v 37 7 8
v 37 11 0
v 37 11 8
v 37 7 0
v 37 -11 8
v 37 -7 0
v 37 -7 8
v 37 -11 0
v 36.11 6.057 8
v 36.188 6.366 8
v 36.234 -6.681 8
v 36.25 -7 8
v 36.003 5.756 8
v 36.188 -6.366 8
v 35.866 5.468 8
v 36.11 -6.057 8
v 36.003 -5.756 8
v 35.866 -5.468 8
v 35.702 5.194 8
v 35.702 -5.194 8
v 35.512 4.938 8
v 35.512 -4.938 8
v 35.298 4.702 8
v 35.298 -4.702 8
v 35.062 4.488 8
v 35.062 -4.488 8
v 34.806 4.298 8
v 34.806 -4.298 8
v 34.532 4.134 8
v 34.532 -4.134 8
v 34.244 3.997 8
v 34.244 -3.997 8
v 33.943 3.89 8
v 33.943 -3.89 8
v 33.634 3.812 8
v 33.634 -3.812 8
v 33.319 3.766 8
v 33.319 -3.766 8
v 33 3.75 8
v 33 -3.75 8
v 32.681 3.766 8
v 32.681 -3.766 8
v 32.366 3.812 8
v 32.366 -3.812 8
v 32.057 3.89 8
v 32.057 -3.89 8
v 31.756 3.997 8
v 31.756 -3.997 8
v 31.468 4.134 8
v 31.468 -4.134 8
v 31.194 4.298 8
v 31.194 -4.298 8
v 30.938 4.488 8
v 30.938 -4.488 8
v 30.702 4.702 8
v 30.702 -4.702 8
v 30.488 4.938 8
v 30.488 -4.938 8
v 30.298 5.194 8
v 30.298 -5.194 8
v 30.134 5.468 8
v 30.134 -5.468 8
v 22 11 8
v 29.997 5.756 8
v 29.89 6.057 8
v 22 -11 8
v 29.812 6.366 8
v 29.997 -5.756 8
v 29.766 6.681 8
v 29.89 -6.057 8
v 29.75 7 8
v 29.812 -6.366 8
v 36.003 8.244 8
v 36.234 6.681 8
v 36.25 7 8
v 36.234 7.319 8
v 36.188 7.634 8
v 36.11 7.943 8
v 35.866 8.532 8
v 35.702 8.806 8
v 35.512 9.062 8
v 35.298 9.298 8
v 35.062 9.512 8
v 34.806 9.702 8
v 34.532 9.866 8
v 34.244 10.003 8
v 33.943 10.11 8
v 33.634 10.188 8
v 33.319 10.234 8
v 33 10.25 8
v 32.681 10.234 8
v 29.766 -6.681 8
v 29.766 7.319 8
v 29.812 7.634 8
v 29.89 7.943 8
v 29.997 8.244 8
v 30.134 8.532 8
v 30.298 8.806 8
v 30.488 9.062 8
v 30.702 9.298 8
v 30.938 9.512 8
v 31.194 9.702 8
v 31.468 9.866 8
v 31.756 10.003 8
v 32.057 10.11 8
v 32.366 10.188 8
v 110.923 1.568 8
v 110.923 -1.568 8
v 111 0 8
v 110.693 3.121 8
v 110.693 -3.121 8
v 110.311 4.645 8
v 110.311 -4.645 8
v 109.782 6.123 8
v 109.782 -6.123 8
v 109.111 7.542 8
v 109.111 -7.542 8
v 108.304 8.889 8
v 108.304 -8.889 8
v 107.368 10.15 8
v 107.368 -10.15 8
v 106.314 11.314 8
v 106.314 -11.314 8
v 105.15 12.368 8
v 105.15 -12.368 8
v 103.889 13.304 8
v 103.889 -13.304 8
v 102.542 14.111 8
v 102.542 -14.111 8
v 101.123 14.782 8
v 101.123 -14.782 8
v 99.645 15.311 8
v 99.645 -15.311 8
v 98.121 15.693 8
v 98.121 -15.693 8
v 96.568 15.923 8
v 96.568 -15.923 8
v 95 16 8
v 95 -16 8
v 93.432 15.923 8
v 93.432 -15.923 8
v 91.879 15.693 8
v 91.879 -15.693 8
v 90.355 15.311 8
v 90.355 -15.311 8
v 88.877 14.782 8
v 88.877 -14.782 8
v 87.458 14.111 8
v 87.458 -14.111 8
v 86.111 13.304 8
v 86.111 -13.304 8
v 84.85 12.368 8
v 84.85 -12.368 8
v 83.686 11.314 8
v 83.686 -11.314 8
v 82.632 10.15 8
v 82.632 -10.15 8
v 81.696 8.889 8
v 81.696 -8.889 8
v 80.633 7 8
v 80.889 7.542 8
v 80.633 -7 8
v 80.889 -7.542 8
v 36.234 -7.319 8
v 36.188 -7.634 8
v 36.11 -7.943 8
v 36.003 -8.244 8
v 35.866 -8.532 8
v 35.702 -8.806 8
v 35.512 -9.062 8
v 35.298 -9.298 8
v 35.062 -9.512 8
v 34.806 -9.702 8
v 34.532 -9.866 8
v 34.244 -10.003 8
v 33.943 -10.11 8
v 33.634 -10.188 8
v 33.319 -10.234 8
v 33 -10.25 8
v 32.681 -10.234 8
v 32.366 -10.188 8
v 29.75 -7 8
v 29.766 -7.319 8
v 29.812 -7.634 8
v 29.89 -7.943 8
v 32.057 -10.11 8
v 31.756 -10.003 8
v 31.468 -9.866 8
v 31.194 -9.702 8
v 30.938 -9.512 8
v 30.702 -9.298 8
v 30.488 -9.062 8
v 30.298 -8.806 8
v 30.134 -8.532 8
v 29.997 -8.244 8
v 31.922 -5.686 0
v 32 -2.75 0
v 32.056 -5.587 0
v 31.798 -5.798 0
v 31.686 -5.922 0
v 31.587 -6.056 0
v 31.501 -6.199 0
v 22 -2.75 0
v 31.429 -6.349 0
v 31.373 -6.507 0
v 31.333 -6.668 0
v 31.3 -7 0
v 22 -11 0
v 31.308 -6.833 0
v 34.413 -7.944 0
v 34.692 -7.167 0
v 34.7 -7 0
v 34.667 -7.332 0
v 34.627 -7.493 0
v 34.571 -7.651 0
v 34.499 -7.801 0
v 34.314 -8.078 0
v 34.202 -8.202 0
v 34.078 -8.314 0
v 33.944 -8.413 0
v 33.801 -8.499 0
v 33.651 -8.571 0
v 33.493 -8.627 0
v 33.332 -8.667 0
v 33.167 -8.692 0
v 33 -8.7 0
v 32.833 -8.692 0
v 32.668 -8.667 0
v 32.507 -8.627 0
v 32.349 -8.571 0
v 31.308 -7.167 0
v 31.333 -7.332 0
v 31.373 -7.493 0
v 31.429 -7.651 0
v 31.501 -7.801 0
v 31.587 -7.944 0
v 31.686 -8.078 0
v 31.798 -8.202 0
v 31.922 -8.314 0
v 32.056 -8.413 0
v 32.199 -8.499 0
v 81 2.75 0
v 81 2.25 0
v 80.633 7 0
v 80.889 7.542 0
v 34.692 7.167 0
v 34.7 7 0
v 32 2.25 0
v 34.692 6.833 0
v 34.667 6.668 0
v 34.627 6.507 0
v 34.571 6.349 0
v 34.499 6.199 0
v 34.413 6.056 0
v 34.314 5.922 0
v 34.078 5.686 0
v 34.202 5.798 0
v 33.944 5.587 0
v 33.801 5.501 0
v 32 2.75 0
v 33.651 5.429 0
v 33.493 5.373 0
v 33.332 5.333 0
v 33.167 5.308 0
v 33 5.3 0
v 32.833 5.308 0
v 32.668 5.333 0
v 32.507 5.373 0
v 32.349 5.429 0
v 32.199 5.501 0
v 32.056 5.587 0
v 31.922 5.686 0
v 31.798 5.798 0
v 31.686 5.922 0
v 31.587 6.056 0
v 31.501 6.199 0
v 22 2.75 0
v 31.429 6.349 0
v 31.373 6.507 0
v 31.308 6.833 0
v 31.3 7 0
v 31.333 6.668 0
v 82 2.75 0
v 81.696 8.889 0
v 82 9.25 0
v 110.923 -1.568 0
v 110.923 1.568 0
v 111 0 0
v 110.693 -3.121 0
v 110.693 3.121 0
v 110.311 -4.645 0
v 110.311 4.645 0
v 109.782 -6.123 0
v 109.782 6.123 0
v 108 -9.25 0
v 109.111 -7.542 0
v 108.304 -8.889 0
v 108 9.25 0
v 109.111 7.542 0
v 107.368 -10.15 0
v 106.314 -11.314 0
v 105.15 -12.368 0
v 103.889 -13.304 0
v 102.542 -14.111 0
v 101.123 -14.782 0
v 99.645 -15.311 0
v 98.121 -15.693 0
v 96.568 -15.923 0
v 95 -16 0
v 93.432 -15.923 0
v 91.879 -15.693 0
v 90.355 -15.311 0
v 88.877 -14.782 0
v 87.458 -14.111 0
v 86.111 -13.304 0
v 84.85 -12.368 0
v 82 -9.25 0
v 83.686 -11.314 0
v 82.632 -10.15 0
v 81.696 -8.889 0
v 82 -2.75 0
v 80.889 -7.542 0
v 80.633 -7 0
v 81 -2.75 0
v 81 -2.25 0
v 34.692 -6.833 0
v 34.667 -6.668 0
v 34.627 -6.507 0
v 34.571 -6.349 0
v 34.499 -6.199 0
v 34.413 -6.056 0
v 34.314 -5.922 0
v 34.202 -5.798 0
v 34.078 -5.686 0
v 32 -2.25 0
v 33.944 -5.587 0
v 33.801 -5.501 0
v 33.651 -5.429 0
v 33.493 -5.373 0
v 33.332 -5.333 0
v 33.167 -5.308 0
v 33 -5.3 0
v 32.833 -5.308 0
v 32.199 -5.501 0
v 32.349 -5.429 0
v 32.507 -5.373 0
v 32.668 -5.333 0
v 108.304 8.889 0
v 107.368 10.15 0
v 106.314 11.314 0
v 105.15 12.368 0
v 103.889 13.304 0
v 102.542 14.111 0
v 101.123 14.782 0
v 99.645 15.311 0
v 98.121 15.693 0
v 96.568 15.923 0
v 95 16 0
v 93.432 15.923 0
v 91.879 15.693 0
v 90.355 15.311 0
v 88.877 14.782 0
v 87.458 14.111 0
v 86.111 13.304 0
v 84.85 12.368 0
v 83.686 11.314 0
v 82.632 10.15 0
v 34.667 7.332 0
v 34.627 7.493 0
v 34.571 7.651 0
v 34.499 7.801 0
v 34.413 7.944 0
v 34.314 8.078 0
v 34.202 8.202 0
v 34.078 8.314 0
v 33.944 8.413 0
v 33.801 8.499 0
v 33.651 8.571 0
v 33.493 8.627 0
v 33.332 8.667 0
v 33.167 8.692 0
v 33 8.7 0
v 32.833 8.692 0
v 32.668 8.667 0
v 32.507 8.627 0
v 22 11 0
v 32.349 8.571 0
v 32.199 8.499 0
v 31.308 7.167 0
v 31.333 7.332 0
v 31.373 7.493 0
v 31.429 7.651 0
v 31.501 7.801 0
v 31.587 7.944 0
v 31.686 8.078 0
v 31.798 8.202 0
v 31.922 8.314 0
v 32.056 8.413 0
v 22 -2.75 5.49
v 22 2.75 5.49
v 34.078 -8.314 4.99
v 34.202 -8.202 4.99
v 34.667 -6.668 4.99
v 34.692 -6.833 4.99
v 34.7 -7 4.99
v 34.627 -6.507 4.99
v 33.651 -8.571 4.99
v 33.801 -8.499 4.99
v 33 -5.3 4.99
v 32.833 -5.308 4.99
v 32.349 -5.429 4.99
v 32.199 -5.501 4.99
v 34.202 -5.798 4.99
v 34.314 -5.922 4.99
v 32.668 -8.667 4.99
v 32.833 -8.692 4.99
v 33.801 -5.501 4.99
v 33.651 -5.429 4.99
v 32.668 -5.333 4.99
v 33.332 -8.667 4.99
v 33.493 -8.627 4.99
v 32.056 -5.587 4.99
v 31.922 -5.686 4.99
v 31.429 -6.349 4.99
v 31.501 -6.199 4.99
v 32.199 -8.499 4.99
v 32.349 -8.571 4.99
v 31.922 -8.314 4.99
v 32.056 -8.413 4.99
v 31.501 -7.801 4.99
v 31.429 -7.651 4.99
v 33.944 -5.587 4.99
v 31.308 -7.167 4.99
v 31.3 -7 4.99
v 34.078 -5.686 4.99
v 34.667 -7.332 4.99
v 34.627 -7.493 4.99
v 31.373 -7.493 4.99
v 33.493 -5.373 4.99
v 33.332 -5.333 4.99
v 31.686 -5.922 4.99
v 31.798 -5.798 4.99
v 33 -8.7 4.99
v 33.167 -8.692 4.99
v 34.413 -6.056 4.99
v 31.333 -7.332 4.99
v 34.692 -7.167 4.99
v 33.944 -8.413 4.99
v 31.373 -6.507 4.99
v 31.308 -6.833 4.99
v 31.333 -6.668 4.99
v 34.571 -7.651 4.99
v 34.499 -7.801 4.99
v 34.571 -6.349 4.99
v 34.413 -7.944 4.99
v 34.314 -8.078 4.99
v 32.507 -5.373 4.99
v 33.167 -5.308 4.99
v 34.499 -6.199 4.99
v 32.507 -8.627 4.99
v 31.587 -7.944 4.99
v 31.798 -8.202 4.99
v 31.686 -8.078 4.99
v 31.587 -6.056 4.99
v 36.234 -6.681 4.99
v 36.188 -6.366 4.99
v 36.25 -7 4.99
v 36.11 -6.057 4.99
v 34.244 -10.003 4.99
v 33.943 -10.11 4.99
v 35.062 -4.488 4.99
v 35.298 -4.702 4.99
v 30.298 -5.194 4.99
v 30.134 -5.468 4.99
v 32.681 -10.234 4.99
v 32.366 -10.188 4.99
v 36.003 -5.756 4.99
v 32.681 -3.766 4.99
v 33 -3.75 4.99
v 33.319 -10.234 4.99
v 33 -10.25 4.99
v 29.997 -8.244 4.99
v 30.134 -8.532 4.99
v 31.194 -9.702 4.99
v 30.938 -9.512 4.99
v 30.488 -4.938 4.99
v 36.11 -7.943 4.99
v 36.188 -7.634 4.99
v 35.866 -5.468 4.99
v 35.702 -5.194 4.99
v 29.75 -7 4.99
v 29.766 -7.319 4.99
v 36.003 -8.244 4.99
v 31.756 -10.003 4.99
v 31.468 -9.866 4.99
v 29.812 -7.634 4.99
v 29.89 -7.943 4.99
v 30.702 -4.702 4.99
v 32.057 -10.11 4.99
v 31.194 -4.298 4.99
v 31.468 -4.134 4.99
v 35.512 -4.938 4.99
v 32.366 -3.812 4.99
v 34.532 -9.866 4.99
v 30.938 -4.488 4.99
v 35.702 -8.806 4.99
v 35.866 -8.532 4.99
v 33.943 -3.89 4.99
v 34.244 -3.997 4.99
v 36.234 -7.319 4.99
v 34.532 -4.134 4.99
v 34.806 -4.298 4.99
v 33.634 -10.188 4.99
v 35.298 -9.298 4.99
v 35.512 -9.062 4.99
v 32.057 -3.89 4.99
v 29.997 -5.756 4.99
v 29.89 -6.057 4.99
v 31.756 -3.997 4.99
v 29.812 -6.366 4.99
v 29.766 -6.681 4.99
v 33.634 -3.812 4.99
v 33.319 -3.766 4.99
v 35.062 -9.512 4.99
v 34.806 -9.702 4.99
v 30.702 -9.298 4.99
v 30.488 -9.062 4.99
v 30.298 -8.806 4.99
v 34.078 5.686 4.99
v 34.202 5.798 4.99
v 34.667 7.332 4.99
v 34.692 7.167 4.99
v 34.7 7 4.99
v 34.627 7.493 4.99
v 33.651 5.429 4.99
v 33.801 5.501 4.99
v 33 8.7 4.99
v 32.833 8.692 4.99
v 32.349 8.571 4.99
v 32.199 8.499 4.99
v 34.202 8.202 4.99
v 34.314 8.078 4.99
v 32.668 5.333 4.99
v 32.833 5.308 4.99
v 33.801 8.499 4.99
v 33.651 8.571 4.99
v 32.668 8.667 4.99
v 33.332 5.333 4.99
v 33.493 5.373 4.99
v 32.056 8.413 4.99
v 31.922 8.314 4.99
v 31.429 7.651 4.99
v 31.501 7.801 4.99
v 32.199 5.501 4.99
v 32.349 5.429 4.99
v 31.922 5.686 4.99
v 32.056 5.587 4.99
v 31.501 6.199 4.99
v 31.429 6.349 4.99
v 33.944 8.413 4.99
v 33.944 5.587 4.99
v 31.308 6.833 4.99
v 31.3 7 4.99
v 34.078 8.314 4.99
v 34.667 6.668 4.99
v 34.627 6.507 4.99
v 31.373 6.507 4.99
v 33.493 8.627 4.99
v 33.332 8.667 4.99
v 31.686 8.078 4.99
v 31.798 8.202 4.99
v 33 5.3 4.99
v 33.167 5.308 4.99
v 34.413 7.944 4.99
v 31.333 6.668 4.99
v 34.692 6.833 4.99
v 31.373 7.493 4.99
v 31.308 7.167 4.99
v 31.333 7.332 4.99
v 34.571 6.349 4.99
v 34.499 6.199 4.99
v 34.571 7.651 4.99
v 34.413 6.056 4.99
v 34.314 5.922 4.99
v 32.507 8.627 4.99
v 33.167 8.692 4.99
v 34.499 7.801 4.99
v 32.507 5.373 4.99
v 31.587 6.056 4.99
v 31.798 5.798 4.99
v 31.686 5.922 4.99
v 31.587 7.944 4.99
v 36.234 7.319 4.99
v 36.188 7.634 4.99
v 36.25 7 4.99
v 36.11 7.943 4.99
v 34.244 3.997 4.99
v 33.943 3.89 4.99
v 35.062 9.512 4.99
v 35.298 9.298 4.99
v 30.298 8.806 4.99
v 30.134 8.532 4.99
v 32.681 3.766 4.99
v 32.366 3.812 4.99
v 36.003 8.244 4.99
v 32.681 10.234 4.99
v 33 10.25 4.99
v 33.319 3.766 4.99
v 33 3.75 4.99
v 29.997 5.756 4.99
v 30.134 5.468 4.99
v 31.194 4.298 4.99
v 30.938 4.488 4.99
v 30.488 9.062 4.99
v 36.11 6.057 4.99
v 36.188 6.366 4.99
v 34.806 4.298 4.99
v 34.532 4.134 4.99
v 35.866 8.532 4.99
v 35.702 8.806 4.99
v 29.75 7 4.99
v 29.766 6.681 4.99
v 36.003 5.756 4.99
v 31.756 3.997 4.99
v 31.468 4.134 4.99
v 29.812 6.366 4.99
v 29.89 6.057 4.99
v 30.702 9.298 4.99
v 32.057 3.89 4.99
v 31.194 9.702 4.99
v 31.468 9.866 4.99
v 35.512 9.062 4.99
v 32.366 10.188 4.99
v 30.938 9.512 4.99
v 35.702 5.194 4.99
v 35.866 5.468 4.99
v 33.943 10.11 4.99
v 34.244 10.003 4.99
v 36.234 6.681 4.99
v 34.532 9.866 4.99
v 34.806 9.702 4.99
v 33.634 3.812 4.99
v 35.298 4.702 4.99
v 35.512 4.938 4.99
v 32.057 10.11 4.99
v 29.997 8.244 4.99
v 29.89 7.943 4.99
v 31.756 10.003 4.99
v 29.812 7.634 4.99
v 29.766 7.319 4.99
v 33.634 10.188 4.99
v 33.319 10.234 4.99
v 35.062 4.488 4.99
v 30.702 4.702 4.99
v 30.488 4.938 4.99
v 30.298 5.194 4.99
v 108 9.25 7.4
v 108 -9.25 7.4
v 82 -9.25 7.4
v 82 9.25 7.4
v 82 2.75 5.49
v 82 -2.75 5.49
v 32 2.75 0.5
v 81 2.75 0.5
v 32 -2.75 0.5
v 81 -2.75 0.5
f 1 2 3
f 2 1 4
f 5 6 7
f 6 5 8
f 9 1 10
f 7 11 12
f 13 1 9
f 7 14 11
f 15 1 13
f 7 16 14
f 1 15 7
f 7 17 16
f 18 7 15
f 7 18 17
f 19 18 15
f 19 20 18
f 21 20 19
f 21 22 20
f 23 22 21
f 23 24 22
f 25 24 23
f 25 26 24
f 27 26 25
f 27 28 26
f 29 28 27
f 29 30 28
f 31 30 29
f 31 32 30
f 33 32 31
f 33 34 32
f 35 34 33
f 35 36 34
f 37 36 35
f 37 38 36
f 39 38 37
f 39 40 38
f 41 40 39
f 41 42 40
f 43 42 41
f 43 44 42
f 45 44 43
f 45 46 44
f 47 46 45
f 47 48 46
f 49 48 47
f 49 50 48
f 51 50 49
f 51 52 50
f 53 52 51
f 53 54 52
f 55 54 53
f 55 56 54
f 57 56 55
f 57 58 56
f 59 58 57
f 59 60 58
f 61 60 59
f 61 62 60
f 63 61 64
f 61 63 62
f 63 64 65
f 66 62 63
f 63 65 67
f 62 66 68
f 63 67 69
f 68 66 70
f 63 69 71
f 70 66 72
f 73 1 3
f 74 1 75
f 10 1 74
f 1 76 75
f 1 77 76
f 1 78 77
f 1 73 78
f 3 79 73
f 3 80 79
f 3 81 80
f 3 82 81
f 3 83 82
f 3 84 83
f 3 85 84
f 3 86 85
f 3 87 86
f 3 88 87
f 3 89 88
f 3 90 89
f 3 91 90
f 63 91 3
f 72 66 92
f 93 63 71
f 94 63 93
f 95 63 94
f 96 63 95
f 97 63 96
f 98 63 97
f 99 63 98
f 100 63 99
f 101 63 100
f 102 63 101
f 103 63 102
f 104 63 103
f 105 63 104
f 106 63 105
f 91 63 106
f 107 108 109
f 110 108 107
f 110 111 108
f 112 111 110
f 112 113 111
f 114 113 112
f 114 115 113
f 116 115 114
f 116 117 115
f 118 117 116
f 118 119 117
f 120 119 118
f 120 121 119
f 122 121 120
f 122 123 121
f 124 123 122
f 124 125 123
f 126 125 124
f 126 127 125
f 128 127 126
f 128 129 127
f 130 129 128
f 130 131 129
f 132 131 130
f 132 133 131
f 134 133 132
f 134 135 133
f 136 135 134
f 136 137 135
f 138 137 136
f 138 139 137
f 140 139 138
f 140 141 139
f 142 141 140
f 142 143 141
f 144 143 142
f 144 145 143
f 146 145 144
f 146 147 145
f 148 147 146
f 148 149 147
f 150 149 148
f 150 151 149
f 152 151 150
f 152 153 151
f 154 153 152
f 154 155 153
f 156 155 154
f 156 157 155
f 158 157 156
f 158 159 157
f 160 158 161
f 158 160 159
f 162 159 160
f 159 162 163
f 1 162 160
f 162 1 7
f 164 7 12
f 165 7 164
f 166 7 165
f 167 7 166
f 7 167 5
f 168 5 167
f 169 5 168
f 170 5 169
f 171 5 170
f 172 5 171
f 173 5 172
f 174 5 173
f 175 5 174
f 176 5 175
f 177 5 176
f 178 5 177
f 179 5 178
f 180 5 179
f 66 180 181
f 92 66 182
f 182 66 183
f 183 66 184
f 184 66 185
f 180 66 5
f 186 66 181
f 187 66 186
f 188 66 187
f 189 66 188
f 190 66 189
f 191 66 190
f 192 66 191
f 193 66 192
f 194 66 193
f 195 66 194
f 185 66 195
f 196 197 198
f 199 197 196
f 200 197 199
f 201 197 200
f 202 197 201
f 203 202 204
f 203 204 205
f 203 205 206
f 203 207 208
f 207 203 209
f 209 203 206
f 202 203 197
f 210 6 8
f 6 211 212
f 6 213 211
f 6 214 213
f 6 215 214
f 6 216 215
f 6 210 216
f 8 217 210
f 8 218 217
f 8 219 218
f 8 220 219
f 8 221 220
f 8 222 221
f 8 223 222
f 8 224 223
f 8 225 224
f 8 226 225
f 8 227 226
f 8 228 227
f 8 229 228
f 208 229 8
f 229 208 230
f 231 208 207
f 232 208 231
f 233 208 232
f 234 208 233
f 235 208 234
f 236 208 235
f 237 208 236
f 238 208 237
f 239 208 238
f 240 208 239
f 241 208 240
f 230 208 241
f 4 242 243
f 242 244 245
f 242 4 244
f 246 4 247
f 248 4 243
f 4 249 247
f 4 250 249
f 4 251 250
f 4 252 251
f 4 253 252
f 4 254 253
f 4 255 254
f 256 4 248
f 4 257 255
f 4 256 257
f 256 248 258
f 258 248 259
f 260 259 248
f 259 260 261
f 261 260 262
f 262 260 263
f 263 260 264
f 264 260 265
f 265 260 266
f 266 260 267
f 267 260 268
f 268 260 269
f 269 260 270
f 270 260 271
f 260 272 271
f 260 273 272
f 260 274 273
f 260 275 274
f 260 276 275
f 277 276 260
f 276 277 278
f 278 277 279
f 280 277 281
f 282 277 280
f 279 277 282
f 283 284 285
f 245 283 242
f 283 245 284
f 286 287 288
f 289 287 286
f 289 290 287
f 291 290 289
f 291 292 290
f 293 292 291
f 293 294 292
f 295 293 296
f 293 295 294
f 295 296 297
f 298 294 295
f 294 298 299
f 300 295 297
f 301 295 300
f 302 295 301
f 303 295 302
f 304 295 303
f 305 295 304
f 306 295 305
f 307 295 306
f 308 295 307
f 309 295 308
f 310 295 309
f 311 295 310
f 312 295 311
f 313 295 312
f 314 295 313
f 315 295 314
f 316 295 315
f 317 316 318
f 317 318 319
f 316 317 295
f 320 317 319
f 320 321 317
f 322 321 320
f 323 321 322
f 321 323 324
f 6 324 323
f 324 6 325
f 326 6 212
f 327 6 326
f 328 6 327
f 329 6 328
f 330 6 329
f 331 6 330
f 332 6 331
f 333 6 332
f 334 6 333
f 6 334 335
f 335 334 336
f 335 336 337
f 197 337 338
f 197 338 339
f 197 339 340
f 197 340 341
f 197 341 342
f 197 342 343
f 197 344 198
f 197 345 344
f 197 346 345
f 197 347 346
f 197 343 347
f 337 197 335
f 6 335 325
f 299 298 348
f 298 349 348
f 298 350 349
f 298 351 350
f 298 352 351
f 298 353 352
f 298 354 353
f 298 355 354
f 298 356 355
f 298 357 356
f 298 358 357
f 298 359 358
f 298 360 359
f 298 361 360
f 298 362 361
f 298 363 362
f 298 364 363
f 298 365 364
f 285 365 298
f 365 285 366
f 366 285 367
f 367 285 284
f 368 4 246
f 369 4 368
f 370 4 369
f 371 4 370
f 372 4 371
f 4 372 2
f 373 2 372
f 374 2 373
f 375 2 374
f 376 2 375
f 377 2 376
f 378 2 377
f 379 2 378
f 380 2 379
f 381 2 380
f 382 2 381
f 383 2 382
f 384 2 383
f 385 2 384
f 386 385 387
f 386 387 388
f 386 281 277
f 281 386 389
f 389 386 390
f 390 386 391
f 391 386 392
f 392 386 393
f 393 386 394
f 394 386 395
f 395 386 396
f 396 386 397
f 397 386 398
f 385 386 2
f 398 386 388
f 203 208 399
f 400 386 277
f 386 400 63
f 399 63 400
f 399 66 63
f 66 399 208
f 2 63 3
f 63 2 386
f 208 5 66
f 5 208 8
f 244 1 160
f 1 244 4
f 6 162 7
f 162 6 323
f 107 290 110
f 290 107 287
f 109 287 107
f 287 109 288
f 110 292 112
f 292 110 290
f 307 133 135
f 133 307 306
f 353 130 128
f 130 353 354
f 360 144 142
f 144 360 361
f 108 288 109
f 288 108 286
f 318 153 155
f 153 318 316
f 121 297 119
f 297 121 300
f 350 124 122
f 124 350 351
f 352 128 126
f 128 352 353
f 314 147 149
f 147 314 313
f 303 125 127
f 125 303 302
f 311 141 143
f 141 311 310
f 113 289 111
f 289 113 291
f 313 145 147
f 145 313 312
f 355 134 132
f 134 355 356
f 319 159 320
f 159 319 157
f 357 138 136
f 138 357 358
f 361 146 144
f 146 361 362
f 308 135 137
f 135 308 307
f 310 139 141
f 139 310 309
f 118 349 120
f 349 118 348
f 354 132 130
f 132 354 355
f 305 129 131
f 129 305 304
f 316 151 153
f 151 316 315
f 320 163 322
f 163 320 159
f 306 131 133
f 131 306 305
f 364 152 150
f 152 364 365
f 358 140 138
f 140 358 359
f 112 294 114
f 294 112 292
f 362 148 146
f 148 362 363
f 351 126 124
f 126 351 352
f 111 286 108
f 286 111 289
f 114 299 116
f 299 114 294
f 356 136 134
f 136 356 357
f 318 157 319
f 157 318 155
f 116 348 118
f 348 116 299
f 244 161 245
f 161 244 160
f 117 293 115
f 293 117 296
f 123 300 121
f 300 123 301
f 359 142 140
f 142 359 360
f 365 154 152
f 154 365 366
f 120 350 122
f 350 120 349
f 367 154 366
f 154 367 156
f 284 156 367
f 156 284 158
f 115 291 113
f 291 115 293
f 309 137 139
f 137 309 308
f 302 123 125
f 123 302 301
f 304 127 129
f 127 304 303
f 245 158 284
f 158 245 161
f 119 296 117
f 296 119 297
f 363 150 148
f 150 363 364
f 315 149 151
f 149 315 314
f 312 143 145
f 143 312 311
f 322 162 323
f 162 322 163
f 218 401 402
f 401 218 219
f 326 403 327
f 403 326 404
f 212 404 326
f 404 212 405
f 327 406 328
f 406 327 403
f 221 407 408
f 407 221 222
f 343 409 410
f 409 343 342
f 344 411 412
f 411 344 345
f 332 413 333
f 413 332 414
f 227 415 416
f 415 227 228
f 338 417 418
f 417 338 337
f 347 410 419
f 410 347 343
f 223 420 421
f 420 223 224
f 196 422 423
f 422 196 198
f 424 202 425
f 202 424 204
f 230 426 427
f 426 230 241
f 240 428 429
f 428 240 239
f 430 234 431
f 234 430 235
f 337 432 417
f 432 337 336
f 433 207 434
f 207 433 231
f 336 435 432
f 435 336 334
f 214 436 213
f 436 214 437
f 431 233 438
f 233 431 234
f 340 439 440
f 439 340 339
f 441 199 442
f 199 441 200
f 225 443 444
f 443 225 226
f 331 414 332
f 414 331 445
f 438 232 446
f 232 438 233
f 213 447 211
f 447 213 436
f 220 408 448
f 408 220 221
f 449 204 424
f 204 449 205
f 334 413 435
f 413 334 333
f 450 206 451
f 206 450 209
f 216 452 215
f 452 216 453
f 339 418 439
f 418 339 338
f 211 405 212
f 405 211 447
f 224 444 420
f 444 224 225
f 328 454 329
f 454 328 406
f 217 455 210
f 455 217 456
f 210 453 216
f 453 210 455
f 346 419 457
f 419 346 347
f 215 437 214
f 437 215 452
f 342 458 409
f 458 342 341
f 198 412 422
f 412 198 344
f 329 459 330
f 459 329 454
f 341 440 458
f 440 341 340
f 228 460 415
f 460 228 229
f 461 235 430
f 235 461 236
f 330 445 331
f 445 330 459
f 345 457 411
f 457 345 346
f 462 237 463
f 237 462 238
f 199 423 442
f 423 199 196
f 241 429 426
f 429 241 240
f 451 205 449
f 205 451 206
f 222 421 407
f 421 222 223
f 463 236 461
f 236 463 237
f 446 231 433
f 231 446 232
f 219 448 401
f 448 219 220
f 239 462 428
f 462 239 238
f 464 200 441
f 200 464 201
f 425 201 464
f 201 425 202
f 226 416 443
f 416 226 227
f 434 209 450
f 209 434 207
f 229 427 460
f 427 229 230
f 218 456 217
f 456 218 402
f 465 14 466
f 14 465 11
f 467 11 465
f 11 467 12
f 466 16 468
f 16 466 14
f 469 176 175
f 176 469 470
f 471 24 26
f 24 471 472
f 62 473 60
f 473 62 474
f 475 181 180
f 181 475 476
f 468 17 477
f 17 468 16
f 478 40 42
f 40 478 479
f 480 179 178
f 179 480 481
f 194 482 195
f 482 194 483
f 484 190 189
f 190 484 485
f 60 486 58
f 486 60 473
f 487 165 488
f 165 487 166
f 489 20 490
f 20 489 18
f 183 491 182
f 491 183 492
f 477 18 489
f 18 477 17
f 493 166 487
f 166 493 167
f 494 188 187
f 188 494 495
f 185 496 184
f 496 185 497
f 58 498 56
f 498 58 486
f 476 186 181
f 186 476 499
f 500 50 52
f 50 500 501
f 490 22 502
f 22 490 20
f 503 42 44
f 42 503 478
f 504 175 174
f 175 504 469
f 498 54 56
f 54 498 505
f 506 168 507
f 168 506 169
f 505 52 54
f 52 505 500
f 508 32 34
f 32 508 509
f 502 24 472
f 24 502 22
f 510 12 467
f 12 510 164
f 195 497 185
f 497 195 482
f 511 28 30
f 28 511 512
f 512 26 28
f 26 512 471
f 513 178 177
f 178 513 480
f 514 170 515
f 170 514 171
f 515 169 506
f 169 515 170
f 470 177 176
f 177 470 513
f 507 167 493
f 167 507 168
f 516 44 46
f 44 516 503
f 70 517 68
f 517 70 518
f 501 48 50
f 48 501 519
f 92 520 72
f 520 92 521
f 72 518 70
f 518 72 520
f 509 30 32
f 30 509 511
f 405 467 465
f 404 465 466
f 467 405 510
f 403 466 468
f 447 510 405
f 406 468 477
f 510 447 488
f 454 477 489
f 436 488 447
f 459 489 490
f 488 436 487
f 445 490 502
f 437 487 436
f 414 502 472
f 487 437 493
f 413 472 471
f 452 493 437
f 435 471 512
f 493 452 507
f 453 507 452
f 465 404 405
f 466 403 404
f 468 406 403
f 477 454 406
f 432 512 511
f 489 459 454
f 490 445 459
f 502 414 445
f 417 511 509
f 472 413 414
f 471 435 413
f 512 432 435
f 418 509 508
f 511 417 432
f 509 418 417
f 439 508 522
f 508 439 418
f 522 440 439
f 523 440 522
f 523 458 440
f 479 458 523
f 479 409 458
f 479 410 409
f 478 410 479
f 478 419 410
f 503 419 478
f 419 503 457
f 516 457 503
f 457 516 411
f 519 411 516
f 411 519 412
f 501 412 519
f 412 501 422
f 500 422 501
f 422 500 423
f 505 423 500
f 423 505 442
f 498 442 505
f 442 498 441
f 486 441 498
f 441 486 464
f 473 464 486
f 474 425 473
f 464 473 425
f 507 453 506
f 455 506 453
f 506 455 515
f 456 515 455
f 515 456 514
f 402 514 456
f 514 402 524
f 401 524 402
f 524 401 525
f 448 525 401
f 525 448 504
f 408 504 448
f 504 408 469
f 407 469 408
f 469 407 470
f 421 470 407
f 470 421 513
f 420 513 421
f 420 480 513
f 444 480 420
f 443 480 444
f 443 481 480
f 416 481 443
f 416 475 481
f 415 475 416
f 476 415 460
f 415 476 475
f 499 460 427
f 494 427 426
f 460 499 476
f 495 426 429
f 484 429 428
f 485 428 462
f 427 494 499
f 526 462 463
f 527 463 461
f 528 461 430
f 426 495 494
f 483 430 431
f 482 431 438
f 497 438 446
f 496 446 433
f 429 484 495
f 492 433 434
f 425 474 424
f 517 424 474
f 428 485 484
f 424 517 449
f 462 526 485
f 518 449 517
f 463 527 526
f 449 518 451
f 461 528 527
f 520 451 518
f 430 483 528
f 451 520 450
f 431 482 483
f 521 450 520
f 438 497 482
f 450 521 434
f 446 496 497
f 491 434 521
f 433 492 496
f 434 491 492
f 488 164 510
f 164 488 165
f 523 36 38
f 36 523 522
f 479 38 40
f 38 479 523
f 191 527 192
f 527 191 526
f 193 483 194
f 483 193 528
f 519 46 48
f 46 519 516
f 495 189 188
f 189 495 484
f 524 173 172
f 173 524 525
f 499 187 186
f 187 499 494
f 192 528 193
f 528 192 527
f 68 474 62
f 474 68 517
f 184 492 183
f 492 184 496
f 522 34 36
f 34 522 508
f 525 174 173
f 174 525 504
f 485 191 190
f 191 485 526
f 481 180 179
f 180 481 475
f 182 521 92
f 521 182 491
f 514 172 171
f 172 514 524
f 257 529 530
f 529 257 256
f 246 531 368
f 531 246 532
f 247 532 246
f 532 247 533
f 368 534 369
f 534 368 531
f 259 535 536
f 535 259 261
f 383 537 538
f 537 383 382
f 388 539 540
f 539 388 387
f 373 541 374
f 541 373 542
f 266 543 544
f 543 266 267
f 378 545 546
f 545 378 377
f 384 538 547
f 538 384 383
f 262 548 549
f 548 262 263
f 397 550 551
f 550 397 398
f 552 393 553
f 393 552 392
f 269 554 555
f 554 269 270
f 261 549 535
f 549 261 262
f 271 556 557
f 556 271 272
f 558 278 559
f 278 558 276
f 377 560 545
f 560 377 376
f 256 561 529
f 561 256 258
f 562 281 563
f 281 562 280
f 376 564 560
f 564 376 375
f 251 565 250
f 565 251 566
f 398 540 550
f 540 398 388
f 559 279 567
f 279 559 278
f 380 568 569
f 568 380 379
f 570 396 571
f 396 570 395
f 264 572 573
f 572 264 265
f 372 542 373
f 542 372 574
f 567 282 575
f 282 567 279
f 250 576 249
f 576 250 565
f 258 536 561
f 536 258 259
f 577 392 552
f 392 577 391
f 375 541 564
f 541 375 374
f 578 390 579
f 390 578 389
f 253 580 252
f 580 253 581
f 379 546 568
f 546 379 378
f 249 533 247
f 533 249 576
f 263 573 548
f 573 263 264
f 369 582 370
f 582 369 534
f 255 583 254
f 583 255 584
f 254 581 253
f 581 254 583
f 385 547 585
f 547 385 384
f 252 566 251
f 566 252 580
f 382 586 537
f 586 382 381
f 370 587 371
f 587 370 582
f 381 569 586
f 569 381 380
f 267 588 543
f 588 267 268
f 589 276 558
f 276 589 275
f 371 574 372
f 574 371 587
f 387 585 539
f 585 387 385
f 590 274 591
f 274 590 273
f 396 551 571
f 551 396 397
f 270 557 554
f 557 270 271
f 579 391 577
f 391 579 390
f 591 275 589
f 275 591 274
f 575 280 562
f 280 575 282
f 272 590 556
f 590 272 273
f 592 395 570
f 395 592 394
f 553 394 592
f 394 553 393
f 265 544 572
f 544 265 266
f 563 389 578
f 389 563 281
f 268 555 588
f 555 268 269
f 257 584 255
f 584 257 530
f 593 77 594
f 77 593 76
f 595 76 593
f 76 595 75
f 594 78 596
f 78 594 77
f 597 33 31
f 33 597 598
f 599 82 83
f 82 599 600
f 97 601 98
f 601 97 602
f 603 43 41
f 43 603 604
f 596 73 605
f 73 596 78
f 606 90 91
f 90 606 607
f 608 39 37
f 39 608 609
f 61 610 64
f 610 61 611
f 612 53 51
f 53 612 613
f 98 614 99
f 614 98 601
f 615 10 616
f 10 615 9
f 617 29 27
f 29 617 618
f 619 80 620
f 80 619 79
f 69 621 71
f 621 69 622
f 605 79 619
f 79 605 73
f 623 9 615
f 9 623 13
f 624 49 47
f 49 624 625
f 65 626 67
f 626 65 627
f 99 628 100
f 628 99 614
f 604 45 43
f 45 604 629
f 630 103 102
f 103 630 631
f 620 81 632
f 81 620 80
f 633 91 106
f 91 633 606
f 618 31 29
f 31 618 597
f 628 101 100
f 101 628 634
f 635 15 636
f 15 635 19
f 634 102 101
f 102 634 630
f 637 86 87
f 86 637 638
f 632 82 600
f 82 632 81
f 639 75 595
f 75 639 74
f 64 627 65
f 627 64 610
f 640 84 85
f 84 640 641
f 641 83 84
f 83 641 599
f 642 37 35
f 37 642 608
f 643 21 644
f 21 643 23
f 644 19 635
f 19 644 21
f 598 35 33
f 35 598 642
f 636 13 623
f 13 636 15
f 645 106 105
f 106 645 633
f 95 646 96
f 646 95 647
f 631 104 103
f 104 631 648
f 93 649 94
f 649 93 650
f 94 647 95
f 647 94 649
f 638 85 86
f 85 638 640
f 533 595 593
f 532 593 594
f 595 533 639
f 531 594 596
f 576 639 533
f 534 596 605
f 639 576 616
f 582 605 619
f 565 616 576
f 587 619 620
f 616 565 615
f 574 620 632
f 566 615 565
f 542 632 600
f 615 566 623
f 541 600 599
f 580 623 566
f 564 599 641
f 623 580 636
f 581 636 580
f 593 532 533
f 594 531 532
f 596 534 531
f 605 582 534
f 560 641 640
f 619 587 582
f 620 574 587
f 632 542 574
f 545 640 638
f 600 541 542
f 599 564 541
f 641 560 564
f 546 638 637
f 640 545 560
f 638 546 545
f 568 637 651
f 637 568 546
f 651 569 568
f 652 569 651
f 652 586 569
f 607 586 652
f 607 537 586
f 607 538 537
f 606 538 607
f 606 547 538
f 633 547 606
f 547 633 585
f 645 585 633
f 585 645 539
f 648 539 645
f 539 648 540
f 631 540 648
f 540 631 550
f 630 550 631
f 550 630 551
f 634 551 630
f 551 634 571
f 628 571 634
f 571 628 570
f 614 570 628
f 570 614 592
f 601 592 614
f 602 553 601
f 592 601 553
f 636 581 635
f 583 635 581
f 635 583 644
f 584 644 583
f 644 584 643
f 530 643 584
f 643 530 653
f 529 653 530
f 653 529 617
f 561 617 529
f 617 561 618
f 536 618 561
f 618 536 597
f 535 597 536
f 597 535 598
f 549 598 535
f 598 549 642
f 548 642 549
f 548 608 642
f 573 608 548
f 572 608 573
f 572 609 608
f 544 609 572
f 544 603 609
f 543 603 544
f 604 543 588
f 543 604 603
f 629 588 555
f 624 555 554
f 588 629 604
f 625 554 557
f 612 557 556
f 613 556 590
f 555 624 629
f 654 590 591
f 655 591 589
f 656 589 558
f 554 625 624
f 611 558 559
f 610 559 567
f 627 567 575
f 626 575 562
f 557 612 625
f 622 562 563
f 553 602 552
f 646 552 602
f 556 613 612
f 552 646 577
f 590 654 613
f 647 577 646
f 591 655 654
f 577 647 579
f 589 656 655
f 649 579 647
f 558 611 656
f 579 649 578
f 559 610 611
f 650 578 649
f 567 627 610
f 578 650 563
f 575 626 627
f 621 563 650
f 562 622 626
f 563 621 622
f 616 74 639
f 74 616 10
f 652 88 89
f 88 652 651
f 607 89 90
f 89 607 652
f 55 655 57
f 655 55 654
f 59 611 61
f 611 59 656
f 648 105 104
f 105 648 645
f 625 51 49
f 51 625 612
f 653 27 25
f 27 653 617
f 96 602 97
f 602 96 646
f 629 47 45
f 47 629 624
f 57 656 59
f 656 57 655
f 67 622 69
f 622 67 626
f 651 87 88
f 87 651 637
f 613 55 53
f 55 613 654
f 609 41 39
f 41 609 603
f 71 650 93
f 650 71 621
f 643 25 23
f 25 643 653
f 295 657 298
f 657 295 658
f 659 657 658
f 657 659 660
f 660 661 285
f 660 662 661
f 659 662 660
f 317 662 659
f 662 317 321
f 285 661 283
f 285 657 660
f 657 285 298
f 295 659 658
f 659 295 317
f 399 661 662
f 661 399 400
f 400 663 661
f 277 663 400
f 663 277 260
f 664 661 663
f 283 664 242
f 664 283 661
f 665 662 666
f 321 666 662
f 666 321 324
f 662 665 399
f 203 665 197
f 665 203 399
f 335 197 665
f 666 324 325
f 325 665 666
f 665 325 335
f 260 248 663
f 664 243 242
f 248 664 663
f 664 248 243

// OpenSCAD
// file: model.scad
// GV30 antenna clamp, top half, with a bolt-on arm for an upward-facing lux sensor.
// The clamp is the owner's own print (ref/clamp-upper.stl, from "antenna mount for oversized tubing.3mf"),
// changed three ways: the bore is filled and re-cut narrower, a pad with two M3 heat-set inserts sits
// on its +X shoulder, and a cable port runs from the pad's top down into the bore.
// The arm (part-arm.scad) screws to the pad; its lead lies in a press-in channel on the underside, so a
// broken arm comes off without touching the coax.
// Origin: tube axis on X, clamp split plane at z = 0, antenna axis on Z. Both parts print upright as shown,
// except the arm, which prints upside down (its top face on the bed).

part = "clamp";      // [clamp, arm, assembly]

/* [Clamp: from the owner's file, measured off the mesh] */
tube_r = 20;         // cradle radius (Ø40 tube)
old_bore_d = 19;     // bore in the owner's file
thread_top = 44;     // top of the 1"-14 stub
saddle_top = 27.1;   // top line of the saddle, along X

/* [Changes to the clamp] */
bore_d = 12;         // two coax at 2.7 + one thin patch lead, passed bare; FME fitted after
pad_x0 = 22;         // pad's inboard face: must clear the GV30's base skirt (radius not measured)
pad_x1 = 37;         // the clamp ends at 38.1
pad_w = 22;          // across Y
pad_top = 36;        // arm seats here
insert_d = 4.0;      // M3 heat-set insert hole
insert_h = 6;
screw_x = 33;        // the two M3 screws, at (screw_x, ±screw_dy)
screw_dy = 7;
port_d = 6;          // cable port, pad top to bore
port_x = 27;         // port axis at pad top
port_z_bore = 23;    // port axis where it meets the bore wall (cradle top is at z = 20)

/* [Arm] */
reach = 95;          // antenna axis to sensor centre
arm_t = 8;           // arm thickness
arm_w = 14;
head_d = 32;
board_l = 26;        // VEML7700 board, Adafruit 4162: 25.4 x 17.8 (vendor; not measured), plus clearance
board_w = 18.5;
skin = 0.6;          // white ASA over the sensor: the diffuser and the weather seal, 3 layers at 0.2
lead_w = 5.5;        // channel for the patch lead (not measured)
lead_throat = 4.5;   // the lead presses in past this

/* [Hardware] */
screw_d = 3.4;
cbore_d = 6.5;
cbore_h = 3;

$fn = 64;
e = 0.01;

module owner_clamp() translate([0, 0, 22]) import("ref/clamp-upper.stl", convexity = 6);

port_tilt = atan2(pad_top - port_z_bore, port_x - bore_d / 2);   // above horizontal

module port() {
  // from just above the pad top, down and inboard, ending inside the bore
  translate([port_x, 0, pad_top]) rotate([0, 270 - port_tilt, 0]) translate([0, 0, -3])
    cylinder(d = port_d, h = port_x / cos(port_tilt) + 3);
}

module clamp() {
  difference() {
    union() {
      owner_clamp();
      translate([0, 0, tube_r - 3]) cylinder(d = old_bore_d + 0.6, h = thread_top - tube_r + 3);
      translate([pad_x0, -pad_w / 2, tube_r]) cube([pad_x1 - pad_x0, pad_w, pad_top - tube_r]);
    }
    rotate([0, 90, 0]) cylinder(r = tube_r, h = 200, center = true);
    translate([0, 0, -1]) cylinder(d = bore_d, h = thread_top + 2);
    for (s = [-1, 1]) translate([screw_x, s * screw_dy, pad_top - insert_h]) cylinder(d = insert_d, h = insert_h + e);
    port();
  }
}

module lead_channel(x0, x1) {
  // open on the arm's underside (z = 0 here); lips narrow the mouth so the lead presses in
  translate([x0, -lead_w / 2, -e]) cube([x1 - x0, lead_w, arm_t - 2.5]);
}

module lips(x0, x1) {
  lip = (lead_w - lead_throat) / 2;
  for (s = [-1, 1]) translate([x0, 0, 0]) rotate([90, 0, 90]) linear_extrude(x1 - x0)
    polygon([[s * lead_w / 2, 0], [s * lead_throat / 2, 0], [s * lead_w / 2, lip]]);
}

module arm() {
  // z = 0 is the arm's underside, seated on the pad top
  difference() {
    union() {
      translate([pad_x0, -pad_w / 2, 0]) cube([pad_x1 - pad_x0, pad_w, arm_t]);
      translate([pad_x1 - e, -arm_w / 2, 0]) cube([reach - pad_x1, arm_w, arm_t]);
      translate([reach, 0, 0]) cylinder(d = head_d, h = arm_t);
    }
    for (s = [-1, 1]) translate([screw_x, s * screw_dy, -e]) {
      cylinder(d = screw_d, h = arm_t + 2 * e);
      translate([0, 0, arm_t - cbore_h]) cylinder(d = cbore_d, h = cbore_h + 1);
    }
    translate([reach - board_l / 2, -board_w / 2, -e]) cube([board_l, board_w, arm_t - skin + e]);
    lead_channel(port_x - port_d, reach - board_l / 2 + 1);
  }
  lips(port_x + port_d / 2 + 2, reach - board_l / 2 - 1);
}

module assembly() {
  color("white") clamp();
  color("lightgrey") translate([0, 0, pad_top]) arm();
}

if (part == "clamp") clamp();
else if (part == "arm") arm();
else assembly();
// main file
// The bolt-on arm. Prints upside down: its top face, with the sensor skin, on the bed.
include <model.scad>
part = "arm";
